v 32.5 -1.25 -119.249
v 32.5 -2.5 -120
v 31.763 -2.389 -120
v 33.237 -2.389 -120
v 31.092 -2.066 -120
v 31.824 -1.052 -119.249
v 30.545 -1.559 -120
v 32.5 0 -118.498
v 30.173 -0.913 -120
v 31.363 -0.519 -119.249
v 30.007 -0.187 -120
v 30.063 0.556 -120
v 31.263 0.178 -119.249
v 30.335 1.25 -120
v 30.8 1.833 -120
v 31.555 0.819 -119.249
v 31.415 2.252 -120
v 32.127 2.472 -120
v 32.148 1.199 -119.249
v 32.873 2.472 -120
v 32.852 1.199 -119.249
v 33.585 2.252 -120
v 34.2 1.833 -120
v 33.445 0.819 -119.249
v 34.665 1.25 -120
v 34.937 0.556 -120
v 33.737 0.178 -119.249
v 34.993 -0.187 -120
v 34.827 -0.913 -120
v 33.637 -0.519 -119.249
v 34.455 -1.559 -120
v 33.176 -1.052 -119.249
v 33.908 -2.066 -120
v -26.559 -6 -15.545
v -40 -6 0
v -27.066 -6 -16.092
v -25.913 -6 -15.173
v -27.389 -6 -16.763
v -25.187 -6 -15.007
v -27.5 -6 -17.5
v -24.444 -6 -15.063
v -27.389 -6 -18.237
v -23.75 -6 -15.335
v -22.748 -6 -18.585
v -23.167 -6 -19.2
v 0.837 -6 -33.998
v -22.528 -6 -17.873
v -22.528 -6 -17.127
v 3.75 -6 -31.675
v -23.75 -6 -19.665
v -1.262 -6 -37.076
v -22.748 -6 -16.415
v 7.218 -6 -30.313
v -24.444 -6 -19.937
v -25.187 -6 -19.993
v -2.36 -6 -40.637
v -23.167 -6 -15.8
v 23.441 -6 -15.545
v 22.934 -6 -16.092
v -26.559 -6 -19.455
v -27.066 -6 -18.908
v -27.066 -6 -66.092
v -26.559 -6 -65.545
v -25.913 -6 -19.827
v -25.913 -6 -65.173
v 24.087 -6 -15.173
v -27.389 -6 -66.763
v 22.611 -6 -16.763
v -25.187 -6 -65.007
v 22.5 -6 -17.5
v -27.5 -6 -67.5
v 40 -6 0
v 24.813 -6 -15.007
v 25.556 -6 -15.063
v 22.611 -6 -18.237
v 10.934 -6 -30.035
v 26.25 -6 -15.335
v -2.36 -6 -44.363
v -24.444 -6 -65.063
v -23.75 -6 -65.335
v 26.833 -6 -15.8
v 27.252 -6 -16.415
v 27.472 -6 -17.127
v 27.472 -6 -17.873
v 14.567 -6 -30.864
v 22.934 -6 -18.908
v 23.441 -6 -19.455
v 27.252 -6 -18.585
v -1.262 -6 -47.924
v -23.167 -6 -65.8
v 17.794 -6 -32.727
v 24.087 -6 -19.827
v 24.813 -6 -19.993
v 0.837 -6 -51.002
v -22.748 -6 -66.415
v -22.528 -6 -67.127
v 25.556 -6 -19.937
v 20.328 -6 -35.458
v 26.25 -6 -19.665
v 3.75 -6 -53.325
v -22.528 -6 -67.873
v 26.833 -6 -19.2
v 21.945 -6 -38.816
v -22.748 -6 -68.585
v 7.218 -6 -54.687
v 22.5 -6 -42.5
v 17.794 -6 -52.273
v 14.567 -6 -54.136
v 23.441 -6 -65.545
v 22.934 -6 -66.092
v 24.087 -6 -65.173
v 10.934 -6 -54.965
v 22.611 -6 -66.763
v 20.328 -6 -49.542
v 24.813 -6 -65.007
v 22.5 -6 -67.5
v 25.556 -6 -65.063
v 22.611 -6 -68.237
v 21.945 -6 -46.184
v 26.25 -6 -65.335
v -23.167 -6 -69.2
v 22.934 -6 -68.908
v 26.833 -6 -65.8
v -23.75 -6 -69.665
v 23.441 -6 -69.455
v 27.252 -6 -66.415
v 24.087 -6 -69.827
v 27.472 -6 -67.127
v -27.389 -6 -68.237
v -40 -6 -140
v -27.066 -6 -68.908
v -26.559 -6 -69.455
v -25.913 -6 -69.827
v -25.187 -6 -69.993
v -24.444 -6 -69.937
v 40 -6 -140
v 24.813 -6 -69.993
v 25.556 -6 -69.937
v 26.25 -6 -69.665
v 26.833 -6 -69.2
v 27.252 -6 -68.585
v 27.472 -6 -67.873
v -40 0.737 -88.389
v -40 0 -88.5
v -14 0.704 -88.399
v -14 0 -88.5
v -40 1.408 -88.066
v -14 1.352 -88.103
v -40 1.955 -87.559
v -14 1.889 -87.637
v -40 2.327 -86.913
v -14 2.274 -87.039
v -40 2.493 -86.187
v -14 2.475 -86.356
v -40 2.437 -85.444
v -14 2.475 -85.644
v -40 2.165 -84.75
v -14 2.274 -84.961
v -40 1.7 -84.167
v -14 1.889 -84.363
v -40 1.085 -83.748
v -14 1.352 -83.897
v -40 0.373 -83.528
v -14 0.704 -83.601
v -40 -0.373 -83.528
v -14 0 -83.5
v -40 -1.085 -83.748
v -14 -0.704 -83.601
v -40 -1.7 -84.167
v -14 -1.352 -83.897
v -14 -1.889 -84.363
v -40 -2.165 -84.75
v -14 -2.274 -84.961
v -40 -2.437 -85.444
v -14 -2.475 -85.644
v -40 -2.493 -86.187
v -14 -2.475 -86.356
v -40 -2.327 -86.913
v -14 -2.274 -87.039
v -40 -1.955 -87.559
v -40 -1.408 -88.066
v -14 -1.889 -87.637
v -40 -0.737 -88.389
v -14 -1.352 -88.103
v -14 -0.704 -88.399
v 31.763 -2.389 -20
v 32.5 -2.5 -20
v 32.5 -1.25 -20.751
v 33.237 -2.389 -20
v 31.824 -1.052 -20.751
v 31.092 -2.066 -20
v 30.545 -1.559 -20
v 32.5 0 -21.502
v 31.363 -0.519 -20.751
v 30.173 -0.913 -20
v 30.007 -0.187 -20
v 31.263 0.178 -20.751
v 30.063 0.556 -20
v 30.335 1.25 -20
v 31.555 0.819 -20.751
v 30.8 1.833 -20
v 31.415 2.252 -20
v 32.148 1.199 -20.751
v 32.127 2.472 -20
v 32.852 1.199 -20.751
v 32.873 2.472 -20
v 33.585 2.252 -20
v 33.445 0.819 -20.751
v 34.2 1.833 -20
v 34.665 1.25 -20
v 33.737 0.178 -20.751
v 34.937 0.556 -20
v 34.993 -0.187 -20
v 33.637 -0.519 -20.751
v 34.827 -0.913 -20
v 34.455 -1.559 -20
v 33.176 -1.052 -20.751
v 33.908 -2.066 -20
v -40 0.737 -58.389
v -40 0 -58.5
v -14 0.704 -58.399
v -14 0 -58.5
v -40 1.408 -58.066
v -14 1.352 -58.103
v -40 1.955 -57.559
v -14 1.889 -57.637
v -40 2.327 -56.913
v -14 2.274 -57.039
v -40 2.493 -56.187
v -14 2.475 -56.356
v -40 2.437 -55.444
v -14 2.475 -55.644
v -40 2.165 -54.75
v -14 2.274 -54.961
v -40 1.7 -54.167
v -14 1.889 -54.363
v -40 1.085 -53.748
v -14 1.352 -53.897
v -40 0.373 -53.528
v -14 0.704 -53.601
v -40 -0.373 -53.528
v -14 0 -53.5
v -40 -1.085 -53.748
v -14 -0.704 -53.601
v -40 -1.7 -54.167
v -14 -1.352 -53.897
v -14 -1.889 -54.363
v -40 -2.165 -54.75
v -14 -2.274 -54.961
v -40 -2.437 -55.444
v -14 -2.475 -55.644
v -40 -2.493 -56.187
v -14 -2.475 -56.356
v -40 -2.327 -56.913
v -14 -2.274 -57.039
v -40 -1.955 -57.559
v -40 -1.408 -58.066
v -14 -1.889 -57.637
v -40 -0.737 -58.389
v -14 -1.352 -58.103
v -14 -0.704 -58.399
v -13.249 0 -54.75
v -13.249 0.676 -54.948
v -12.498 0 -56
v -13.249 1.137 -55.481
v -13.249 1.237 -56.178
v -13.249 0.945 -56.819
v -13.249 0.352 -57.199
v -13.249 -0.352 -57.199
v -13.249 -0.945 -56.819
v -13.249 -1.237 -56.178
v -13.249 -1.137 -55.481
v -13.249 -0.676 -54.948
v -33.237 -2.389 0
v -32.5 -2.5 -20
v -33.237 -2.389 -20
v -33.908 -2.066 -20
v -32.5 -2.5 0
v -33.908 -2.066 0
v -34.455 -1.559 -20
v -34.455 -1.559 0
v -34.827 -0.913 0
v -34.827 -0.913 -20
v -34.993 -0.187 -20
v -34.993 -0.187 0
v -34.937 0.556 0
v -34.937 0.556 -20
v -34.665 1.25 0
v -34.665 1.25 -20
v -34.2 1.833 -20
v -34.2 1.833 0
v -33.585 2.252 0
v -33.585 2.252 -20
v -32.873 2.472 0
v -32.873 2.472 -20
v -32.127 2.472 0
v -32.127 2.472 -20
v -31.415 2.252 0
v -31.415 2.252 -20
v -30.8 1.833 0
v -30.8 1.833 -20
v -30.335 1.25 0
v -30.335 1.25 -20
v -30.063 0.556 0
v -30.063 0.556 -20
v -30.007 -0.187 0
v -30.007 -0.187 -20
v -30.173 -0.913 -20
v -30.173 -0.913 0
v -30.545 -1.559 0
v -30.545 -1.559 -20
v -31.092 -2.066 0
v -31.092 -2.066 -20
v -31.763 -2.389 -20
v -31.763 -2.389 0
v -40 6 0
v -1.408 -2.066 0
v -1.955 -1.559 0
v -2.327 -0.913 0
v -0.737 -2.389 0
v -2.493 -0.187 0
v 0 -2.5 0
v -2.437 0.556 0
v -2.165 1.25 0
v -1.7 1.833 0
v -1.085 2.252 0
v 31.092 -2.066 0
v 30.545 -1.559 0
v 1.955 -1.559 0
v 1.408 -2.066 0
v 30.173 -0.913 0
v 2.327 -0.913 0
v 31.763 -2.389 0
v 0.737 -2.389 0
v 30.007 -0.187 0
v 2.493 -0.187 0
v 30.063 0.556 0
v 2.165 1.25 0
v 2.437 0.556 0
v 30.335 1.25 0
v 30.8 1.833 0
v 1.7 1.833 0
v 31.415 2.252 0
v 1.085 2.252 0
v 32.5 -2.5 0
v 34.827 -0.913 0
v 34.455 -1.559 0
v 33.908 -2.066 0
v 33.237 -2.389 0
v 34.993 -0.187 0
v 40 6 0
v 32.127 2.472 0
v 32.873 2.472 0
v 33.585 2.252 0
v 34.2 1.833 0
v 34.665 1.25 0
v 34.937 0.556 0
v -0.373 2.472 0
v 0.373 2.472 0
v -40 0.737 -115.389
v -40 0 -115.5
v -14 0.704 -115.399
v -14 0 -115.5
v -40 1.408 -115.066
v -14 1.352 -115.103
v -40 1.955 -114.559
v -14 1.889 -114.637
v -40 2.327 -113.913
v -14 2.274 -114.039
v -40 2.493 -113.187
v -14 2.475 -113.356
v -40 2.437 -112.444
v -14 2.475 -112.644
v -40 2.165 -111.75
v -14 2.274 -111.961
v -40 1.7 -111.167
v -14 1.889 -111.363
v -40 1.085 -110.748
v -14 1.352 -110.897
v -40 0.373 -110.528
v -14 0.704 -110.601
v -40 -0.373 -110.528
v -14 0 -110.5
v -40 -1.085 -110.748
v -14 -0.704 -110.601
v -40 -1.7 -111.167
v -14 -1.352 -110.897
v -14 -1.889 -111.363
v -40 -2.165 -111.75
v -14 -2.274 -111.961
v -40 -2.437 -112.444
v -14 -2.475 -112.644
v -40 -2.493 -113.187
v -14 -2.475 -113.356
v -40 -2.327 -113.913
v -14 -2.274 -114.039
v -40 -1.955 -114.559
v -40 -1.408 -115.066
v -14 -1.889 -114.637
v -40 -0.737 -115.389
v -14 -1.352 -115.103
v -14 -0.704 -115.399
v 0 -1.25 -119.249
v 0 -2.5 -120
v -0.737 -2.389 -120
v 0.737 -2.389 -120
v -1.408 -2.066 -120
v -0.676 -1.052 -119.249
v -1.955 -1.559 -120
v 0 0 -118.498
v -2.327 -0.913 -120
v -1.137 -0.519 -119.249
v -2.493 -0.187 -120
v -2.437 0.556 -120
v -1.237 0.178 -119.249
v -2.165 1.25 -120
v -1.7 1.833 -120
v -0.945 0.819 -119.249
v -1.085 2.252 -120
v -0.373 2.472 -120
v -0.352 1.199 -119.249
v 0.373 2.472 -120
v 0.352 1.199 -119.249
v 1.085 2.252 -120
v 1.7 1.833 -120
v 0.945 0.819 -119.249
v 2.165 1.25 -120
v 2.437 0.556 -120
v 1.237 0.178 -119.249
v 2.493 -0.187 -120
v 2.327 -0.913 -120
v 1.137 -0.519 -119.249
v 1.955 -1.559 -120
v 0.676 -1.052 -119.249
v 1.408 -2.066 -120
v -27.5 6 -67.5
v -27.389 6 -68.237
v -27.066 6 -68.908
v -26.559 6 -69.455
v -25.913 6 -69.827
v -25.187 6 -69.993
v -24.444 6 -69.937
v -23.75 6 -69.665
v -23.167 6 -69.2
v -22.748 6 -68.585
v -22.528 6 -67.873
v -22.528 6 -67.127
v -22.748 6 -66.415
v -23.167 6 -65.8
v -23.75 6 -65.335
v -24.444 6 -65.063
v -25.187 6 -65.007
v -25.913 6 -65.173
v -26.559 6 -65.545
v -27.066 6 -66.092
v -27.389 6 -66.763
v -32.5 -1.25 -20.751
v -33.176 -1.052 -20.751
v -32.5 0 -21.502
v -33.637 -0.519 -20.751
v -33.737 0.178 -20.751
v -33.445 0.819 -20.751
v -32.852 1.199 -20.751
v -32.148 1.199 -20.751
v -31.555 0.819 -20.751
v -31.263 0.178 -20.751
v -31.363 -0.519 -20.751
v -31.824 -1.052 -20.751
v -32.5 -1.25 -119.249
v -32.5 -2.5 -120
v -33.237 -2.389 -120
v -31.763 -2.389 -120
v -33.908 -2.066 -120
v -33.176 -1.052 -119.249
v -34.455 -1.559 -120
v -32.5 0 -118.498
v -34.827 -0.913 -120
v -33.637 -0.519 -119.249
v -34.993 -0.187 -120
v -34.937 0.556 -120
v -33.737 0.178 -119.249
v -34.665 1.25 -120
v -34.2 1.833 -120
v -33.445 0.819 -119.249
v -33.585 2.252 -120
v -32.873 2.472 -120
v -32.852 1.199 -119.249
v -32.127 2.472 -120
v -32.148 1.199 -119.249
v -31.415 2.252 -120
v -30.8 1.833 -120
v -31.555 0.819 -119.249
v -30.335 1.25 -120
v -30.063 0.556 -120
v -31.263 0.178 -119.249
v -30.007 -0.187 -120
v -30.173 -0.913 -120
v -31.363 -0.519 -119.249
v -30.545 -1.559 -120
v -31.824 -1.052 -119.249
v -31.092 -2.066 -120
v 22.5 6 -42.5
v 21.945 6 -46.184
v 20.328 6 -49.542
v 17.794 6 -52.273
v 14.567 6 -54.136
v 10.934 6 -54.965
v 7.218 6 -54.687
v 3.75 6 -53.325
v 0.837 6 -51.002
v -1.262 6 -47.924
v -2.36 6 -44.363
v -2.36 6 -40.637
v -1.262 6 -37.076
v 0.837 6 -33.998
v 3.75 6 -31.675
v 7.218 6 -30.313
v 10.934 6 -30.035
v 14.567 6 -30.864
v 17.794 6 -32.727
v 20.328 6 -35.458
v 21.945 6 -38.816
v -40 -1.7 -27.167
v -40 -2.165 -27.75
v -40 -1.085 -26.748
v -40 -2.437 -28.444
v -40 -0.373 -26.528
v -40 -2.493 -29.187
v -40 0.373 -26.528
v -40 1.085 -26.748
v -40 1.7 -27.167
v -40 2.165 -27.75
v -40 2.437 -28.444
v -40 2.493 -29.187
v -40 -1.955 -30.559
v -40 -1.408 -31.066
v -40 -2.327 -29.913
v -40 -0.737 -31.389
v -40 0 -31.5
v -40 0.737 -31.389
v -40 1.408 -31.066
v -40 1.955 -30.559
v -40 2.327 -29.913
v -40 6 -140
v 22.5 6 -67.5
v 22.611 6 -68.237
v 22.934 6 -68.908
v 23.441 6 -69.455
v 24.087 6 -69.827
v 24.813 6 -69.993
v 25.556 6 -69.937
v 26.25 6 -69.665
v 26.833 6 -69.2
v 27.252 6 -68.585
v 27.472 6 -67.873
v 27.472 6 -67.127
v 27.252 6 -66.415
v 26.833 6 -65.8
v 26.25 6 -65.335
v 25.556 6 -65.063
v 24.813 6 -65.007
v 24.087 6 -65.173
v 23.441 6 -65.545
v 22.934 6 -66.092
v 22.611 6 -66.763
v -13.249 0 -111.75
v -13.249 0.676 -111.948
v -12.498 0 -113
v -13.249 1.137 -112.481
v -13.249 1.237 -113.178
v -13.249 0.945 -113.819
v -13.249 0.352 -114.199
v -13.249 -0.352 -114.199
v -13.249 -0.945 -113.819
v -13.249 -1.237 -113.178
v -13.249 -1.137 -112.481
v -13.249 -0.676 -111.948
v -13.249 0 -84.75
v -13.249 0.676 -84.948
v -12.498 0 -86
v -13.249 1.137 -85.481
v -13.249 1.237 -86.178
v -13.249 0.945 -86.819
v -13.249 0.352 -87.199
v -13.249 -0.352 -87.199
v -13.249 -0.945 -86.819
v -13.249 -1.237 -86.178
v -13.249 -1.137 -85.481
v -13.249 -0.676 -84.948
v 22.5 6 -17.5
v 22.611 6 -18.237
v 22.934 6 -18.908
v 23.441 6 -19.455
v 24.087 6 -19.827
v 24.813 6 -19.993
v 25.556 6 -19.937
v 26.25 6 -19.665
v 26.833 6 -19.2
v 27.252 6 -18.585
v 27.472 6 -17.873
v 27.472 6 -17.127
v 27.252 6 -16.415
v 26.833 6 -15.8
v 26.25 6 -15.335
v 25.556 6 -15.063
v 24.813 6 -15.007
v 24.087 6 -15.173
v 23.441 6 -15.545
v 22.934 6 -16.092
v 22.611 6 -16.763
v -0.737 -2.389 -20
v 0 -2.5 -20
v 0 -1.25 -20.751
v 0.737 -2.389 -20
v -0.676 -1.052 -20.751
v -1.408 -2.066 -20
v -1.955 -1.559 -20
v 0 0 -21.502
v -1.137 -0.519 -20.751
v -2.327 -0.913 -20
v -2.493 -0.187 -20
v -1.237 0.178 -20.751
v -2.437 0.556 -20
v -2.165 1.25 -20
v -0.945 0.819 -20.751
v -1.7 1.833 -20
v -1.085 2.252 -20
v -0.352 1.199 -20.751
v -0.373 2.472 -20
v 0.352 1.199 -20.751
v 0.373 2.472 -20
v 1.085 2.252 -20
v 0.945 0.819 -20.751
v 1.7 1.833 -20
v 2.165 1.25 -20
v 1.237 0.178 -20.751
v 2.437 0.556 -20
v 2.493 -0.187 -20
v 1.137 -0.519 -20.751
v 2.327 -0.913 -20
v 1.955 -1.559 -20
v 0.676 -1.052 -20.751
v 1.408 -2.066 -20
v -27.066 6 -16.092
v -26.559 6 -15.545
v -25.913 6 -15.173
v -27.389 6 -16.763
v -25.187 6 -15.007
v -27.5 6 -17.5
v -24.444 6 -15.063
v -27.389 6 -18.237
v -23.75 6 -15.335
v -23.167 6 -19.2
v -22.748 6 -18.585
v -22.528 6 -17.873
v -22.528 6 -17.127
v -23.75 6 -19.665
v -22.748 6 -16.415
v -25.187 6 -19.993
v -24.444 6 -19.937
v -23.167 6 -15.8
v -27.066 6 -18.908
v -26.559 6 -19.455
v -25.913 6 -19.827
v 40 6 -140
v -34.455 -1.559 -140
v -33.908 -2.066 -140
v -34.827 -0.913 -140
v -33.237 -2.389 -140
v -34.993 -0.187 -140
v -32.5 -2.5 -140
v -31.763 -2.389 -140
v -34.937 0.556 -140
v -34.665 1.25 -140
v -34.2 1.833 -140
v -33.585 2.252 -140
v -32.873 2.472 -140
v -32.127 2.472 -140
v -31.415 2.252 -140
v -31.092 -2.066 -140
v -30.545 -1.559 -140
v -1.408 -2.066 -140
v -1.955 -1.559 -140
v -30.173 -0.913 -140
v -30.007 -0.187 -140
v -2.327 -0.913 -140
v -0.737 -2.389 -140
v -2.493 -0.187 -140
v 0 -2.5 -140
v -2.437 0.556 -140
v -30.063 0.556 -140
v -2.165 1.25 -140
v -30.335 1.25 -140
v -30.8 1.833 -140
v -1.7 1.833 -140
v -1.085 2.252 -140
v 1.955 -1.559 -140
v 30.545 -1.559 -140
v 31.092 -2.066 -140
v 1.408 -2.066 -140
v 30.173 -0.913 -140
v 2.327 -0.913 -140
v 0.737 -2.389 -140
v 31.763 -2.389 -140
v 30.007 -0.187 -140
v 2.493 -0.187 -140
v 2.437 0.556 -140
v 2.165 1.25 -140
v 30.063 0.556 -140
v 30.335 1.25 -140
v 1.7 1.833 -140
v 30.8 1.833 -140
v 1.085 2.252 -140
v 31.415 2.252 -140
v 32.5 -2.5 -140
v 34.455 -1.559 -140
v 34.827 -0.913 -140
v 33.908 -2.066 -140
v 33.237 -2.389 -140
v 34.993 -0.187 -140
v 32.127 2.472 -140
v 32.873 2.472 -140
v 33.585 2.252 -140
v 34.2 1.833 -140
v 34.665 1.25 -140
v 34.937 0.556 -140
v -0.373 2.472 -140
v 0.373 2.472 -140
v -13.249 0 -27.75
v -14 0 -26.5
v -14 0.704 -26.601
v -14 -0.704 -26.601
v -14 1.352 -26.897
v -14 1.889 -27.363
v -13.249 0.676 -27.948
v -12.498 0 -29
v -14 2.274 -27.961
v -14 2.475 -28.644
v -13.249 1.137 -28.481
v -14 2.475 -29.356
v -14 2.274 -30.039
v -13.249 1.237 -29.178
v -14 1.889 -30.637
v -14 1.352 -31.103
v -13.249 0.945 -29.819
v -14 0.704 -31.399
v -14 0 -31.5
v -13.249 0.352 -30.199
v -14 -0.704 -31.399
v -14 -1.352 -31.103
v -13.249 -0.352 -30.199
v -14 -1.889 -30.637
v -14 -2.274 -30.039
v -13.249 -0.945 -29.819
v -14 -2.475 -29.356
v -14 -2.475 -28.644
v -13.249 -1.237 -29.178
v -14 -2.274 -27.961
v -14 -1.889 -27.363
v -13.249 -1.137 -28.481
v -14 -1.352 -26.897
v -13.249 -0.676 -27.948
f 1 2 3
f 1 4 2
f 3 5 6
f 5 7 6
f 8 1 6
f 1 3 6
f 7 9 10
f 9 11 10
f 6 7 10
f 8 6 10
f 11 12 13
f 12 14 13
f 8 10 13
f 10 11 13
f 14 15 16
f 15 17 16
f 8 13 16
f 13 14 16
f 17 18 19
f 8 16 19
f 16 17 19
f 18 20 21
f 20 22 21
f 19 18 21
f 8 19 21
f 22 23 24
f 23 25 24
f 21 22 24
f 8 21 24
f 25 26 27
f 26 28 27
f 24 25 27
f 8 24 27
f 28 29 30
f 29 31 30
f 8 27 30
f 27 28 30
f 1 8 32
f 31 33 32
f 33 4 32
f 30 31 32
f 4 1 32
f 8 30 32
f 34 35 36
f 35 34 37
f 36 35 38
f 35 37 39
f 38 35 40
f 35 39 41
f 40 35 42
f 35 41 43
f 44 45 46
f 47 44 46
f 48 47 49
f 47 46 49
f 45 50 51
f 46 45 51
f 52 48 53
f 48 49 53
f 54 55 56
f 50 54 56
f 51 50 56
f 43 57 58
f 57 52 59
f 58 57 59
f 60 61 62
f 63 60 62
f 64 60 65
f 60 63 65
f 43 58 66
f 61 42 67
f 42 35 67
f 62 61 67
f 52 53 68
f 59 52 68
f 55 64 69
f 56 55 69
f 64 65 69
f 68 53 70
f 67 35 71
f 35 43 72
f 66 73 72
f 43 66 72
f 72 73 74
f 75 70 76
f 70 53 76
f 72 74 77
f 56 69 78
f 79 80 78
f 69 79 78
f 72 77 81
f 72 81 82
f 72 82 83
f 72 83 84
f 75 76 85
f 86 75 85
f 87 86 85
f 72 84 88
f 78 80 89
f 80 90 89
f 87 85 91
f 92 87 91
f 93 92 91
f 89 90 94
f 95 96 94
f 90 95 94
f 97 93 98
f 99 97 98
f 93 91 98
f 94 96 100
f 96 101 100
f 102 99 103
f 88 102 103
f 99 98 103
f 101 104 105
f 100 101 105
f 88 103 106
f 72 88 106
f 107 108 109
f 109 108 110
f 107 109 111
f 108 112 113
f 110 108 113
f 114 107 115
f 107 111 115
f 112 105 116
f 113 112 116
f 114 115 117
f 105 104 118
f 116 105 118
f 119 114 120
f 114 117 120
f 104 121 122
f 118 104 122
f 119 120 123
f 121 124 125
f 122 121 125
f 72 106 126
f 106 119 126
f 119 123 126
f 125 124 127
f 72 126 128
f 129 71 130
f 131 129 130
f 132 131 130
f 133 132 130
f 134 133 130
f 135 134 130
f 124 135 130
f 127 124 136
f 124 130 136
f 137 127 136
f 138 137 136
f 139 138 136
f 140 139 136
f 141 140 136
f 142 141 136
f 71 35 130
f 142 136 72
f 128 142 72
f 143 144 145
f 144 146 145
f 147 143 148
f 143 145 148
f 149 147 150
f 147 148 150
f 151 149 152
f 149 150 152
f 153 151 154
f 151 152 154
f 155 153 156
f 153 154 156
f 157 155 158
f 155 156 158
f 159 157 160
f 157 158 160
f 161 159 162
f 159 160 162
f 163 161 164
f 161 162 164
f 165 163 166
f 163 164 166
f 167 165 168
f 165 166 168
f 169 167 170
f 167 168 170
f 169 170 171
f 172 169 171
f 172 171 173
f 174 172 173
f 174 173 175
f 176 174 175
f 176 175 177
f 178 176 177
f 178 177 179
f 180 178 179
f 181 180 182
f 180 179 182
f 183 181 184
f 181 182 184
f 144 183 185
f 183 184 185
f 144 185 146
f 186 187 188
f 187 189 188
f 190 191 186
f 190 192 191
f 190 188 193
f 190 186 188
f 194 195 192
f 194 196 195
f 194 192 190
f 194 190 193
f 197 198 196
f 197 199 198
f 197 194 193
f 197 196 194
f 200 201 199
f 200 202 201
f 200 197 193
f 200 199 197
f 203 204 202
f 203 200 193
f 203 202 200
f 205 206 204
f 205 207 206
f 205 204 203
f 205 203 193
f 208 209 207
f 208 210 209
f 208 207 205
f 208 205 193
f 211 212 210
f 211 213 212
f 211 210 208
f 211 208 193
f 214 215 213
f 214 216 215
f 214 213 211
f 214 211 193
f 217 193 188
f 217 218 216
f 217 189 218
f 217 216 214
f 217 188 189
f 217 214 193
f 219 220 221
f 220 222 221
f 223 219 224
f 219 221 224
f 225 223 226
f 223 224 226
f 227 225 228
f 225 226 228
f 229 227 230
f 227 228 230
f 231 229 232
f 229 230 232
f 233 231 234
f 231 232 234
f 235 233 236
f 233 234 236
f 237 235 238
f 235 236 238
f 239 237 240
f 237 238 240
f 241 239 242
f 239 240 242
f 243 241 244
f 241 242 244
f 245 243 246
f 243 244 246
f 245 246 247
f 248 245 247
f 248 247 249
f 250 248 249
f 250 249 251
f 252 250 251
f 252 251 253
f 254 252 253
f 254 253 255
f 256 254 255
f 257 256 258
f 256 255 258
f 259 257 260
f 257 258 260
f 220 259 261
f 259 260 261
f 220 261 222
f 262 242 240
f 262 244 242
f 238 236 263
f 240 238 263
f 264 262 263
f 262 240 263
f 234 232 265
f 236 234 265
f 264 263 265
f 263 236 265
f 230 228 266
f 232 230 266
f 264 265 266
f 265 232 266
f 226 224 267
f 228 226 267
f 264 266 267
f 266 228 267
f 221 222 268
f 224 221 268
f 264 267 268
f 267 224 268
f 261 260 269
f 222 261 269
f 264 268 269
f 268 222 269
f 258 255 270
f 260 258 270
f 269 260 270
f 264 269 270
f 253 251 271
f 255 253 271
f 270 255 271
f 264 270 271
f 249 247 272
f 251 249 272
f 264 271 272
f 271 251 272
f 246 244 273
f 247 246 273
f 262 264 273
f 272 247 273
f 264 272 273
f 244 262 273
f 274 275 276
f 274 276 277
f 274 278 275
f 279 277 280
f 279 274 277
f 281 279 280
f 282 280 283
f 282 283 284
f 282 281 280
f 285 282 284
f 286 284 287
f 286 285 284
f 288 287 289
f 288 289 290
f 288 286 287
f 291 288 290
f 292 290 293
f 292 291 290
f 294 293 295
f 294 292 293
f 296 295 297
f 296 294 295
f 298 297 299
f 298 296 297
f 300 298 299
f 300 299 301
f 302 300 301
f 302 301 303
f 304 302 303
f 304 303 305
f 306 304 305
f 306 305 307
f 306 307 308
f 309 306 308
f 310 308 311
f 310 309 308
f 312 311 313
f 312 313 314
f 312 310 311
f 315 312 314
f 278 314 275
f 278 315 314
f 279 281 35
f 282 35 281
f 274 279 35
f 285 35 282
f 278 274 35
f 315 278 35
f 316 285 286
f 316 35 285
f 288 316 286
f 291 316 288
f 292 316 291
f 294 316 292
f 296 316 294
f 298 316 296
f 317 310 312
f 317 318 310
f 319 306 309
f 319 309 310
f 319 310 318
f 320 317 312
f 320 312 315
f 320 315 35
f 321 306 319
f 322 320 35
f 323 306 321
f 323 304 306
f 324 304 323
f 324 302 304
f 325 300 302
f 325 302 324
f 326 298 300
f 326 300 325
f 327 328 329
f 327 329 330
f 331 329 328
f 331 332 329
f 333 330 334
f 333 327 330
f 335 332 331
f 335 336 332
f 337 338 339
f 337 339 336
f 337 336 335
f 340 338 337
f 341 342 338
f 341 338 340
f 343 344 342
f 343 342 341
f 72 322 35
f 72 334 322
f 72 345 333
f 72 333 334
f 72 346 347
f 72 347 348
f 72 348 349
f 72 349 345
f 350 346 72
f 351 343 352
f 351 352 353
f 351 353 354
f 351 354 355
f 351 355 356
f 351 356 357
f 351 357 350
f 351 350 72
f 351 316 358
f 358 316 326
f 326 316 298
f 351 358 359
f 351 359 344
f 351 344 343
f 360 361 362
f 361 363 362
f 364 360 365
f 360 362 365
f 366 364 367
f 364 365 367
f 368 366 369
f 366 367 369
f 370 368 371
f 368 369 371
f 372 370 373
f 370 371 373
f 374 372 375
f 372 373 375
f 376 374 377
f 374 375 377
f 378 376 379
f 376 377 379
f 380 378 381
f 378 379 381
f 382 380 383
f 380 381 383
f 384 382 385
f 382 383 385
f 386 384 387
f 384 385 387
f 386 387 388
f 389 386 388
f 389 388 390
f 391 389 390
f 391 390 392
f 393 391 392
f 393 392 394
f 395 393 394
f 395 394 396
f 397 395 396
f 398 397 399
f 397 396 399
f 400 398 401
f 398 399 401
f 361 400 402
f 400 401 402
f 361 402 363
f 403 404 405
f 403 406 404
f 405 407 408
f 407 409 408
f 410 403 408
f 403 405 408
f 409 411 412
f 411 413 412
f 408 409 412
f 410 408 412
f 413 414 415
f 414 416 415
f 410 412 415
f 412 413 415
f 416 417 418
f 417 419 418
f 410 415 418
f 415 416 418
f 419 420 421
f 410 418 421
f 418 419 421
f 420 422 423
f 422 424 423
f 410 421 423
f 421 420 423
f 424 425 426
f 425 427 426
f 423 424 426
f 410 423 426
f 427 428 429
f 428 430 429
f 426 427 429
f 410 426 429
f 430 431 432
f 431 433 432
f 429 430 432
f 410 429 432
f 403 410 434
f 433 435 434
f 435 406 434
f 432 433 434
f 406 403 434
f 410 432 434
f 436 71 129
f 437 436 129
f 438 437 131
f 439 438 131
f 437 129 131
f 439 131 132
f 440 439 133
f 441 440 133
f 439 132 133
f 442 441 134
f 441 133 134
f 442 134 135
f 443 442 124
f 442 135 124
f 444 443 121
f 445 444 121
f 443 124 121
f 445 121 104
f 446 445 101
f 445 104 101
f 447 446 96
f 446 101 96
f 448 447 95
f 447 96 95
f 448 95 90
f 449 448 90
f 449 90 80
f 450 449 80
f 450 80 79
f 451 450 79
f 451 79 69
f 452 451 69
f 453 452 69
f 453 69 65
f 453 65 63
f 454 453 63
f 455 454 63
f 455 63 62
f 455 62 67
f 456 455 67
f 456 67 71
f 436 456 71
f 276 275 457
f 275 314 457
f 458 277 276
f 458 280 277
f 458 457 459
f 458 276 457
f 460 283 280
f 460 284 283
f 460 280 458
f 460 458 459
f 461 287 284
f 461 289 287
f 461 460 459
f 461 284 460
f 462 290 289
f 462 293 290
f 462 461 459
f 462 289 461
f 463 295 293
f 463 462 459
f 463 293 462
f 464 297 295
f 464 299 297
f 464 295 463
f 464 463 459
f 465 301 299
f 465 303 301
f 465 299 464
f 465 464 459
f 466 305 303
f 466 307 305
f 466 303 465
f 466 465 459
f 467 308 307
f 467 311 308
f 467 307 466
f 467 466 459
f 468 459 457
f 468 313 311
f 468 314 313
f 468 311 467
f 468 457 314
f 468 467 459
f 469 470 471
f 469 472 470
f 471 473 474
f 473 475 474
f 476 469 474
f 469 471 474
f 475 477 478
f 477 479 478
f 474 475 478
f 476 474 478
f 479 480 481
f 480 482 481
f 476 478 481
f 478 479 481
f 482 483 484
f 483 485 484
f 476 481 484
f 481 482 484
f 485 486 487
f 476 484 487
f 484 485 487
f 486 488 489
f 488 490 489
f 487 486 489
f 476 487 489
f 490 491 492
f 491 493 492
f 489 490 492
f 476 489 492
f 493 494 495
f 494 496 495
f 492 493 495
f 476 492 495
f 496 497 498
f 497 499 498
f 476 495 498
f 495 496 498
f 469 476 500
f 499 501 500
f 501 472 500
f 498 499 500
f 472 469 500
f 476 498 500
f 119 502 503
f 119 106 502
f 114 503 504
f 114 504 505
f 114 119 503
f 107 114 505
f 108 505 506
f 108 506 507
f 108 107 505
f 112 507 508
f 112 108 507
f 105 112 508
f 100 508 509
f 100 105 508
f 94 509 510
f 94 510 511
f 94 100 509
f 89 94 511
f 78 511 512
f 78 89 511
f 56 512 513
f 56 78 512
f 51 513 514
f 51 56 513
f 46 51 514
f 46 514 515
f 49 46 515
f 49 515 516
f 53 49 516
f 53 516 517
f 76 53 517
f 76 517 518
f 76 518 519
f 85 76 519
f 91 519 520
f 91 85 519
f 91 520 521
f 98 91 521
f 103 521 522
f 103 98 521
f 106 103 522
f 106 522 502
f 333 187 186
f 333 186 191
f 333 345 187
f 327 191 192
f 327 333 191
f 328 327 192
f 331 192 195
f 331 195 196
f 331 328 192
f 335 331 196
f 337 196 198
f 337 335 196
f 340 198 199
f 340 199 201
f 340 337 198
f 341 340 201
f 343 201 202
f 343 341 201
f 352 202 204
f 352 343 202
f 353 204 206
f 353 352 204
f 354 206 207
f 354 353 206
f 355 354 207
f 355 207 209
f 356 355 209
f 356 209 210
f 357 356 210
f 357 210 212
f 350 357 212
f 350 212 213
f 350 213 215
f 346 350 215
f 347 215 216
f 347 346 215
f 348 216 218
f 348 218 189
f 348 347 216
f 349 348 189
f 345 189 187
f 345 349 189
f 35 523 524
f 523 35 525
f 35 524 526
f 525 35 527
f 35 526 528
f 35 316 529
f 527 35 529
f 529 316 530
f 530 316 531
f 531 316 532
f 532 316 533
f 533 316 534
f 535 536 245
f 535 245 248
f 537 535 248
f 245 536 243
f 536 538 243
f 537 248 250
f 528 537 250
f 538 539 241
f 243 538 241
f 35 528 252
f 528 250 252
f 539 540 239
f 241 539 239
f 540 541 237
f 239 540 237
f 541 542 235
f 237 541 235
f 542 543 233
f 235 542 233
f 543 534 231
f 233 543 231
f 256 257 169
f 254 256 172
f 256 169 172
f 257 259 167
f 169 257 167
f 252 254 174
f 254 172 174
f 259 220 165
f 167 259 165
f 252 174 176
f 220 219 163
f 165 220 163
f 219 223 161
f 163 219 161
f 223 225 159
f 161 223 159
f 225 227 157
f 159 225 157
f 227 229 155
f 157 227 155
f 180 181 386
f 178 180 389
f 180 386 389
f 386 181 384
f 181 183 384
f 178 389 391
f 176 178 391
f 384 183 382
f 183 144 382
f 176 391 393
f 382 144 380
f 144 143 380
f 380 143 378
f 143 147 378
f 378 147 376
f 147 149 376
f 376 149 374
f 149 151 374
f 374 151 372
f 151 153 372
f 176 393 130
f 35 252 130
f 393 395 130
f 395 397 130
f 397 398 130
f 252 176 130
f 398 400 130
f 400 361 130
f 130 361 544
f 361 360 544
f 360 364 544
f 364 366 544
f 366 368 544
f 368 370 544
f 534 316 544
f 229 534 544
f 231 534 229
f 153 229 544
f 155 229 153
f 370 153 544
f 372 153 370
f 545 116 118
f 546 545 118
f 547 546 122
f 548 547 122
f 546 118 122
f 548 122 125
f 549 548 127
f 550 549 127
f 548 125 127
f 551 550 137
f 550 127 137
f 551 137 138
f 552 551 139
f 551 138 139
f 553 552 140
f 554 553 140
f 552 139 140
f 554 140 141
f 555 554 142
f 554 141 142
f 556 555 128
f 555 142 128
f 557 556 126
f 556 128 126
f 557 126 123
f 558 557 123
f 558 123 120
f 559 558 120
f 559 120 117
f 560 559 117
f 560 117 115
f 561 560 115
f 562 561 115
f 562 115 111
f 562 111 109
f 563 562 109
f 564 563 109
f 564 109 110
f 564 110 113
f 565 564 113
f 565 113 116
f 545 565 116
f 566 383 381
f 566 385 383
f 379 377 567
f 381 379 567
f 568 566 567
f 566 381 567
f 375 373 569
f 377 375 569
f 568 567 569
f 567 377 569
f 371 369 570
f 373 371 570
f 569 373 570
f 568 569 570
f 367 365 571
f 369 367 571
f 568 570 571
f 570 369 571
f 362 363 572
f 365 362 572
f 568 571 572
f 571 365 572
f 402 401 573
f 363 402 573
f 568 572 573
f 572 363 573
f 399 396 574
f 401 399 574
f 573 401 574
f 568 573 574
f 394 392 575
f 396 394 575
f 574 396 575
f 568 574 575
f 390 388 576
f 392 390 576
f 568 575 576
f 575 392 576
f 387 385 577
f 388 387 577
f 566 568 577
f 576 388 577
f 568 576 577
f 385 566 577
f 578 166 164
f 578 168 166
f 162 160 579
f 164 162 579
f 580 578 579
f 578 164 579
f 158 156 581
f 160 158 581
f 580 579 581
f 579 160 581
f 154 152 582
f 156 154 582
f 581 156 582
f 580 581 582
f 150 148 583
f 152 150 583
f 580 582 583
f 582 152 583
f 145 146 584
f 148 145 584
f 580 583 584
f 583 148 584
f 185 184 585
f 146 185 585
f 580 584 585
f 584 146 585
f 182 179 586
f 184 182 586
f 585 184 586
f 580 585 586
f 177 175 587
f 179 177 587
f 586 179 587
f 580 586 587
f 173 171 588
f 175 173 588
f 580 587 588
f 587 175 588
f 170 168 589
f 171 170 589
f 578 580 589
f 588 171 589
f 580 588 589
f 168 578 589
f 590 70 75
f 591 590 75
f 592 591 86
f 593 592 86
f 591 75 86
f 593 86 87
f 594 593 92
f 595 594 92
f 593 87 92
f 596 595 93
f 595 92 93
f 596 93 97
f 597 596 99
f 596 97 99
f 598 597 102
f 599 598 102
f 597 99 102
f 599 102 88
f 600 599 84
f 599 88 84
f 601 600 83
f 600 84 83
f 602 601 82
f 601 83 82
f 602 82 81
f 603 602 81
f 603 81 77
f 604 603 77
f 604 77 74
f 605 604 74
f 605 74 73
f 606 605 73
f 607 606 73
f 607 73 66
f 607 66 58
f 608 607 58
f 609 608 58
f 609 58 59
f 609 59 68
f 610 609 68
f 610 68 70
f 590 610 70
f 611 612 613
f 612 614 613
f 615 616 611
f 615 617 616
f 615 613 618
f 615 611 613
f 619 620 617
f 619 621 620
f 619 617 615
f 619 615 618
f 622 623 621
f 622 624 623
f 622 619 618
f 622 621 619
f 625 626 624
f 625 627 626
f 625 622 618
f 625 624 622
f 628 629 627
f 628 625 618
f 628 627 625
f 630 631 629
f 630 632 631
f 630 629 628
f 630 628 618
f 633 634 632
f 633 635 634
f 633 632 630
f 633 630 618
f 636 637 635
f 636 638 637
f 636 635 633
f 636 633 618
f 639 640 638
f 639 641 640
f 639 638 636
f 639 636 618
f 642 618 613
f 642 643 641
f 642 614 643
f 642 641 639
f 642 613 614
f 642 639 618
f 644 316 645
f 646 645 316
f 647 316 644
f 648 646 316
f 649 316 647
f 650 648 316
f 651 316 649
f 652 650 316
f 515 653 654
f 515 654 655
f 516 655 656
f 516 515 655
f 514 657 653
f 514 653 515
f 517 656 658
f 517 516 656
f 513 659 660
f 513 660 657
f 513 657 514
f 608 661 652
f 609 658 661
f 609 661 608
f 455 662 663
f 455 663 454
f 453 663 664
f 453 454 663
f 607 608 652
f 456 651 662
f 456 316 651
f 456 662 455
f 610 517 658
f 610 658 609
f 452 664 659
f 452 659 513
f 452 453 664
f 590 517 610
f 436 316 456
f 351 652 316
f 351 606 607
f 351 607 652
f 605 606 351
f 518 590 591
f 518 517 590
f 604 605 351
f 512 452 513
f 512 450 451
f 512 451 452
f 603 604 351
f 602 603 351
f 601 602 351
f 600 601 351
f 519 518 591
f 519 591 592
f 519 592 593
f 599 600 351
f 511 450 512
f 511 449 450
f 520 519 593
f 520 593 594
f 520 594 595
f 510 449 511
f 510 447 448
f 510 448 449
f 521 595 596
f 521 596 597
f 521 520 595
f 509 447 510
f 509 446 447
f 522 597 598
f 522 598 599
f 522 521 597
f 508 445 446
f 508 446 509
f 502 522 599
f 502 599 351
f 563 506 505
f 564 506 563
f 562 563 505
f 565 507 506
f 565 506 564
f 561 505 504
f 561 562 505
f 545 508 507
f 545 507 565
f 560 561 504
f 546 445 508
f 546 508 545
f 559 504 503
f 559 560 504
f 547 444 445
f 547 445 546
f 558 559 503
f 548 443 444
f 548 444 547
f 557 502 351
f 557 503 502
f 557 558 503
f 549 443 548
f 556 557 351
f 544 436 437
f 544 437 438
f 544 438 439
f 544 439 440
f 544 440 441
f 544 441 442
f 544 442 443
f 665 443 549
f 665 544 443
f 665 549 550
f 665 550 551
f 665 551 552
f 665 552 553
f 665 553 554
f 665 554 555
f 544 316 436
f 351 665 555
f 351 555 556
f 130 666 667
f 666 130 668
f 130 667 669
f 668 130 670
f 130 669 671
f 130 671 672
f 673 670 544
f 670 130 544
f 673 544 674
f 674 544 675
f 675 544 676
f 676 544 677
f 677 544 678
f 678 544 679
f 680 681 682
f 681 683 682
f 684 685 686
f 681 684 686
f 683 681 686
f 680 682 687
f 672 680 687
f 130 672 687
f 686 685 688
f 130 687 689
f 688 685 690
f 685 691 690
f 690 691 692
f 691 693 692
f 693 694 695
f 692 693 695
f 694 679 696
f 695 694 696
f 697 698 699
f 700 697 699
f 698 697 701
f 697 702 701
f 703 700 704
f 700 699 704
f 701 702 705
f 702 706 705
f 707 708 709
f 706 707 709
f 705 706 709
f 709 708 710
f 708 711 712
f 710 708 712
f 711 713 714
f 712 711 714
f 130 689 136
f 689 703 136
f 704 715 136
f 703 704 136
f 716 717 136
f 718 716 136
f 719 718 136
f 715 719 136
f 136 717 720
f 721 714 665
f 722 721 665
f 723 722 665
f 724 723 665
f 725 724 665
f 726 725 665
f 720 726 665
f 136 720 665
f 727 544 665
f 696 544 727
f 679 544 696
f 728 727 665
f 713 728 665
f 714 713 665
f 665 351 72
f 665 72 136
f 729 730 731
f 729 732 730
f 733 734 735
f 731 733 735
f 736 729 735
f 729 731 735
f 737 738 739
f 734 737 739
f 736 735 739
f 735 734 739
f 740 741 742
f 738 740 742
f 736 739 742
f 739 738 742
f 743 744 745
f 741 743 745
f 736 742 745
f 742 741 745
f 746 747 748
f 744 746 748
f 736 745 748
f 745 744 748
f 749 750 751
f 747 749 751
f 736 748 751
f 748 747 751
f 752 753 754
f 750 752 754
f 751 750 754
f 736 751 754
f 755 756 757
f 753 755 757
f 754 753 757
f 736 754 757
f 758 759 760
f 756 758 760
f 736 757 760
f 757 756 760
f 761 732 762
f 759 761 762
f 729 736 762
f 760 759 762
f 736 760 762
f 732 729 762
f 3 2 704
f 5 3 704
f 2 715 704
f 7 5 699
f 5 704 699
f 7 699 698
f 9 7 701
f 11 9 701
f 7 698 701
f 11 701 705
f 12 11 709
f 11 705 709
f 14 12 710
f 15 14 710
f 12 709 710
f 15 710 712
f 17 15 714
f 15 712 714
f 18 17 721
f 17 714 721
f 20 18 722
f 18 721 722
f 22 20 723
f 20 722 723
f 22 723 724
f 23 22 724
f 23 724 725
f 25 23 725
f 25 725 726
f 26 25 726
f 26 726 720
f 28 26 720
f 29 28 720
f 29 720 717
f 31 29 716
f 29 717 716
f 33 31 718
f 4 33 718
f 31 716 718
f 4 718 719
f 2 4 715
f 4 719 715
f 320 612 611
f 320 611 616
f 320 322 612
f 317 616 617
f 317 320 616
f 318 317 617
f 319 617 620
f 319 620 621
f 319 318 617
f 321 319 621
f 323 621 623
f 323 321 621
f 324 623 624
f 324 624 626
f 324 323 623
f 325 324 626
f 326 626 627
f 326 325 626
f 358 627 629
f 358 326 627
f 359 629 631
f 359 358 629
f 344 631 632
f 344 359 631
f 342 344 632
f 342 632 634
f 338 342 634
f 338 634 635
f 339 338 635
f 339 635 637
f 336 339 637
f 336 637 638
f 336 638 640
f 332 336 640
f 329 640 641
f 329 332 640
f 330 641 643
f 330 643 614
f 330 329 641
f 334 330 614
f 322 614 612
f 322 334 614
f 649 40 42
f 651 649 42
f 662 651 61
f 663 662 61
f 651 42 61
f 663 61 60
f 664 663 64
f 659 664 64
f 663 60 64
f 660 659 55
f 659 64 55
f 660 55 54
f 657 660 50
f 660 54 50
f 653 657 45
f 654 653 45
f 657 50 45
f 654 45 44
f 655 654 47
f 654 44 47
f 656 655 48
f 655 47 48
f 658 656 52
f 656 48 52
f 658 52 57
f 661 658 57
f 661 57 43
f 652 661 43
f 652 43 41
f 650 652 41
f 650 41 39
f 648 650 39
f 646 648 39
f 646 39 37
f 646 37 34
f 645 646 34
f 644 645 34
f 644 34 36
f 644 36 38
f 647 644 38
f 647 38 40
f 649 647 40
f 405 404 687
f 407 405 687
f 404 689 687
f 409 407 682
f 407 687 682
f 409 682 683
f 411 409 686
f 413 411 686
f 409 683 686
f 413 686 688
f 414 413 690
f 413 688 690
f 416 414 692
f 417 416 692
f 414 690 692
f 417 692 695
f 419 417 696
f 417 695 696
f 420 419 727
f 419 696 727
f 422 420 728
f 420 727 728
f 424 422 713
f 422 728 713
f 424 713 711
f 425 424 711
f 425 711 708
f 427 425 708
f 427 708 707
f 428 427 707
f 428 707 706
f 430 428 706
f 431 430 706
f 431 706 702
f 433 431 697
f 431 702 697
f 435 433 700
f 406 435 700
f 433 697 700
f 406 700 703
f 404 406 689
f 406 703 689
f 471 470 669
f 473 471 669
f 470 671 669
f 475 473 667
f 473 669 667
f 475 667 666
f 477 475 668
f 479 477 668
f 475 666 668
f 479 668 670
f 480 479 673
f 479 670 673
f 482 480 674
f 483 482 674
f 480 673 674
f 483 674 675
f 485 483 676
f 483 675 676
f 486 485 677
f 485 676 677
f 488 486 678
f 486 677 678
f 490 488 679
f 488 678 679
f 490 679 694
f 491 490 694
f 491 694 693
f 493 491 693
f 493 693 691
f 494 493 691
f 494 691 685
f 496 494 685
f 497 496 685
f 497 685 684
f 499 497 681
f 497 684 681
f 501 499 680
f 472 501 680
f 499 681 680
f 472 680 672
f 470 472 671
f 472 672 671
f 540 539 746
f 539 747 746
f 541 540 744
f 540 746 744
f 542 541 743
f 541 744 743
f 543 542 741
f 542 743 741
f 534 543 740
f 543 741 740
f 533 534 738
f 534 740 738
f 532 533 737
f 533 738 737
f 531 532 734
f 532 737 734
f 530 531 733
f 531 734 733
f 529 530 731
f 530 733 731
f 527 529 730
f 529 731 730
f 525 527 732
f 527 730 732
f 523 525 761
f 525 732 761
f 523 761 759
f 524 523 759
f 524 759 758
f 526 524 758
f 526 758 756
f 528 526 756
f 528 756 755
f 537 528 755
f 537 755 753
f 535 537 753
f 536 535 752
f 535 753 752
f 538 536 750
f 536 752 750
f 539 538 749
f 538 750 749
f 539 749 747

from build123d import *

# Parameters (mm, degrees)
SKETCH1_W                        = 80
SKETCH1_H                        = 140
SKETCH1_R                        = 12.5
BOSS_EXTRUDE1_DEPTH              = 6
TAP_DRILL_FOR_M6_TAP1_D          = 5
TAP_DRILL_FOR_M6_TAP2_AT_2_COUNT = 2
TAP_DRILL_FOR_M6_TAP2_AT_2_PITCH = 32.5
TAP_DRILL_FOR_M6_TAP2_AT_3_COUNT = 2
TAP_DRILL_FOR_M6_TAP2_AT_3_PITCH = 65
TAP_DRILL_FOR_M6_TAP3_D          = 5
TAP_DRILL_FOR_M6_TAP3_DEPTH      = 26
TAP_DRILL_FOR_M6_TAP3_TIP        = 1.502151548


with BuildPart() as part:
    # Sketch1 → Boss-Extrude1 (new body, symmetric)
    with BuildSketch(Plane(origin=(0, 0, 0), x_dir=(1, 0, 0), z_dir=(0, 1, 0))):
        with Locations((0, 70)):
            Rectangle(SKETCH1_W, SKETCH1_H)
        with Locations((10, 42.5)):
            Circle(SKETCH1_R, mode=Mode.SUBTRACT)
    extrude(amount=BOSS_EXTRUDE1_DEPTH, both=True)

    # Tap Drill for M6 Tap1 (through all)
    with Locations(Plane(origin=(0, 6, 0), x_dir=(1, 0, 0), z_dir=(0, 1, 0))):
        with Locations((-25, 67.5), (25, 67.5), (25, 17.5), (-25, 17.5)):
            Hole(TAP_DRILL_FOR_M6_TAP1_D / 2)

    # Sketch9 → Tap Drill for M6 Tap2 (revolve, cut)
    with BuildSketch(Plane(origin=(32.5, 0, 0), x_dir=(0, -1, 0), z_dir=(1, 0, 0))):
        Polygon((0, 0), (0, 21.502151548), (2.5, 20), (2.5, 0), align=None)
    tap_drill_for_m6_tap2 = revolve(axis=Axis((32.5, 0, 6.35), (0, 0, -1)), mode=Mode.SUBTRACT)

    # Tap Drill for M6 Tap2 at 2: Tap Drill for M6 Tap2 ×2
    with Locations(*[(-i * TAP_DRILL_FOR_M6_TAP2_AT_2_PITCH, 0, 0) for i in range(1, TAP_DRILL_FOR_M6_TAP2_AT_2_COUNT)]):
        add(tap_drill_for_m6_tap2, mode=Mode.SUBTRACT)

    # Tap Drill for M6 Tap2 at 3: Tap Drill for M6 Tap2 ×2
    with Locations(*[(-i * TAP_DRILL_FOR_M6_TAP2_AT_3_PITCH, 0, 0) for i in range(1, TAP_DRILL_FOR_M6_TAP2_AT_3_COUNT)]):
        add(tap_drill_for_m6_tap2, mode=Mode.SUBTRACT)

    # Mirror1: Tap Drill for M6 Tap2 across plane
    add(tap_drill_for_m6_tap2.mirror(Plane(origin=(0, 0, -70), x_dir=(1, 0, 0), z_dir=(0, 0, -1))), mode=Mode.SUBTRACT)

    # Mirror1 copy 1 sketch → Mirror1 copy 1 (revolve, cut)
    with BuildSketch(Plane(origin=(0, 0, -140), x_dir=(0, -1, 0), z_dir=(1, 0, 0))):
        Polygon((0, 0), (0, -21.502151548), (2.5, -20), (2.5, 0), align=None)
    revolve(axis=Axis((0, 0, -146.35), (0, 0, -1)), mode=Mode.SUBTRACT)

    # Mirror1 copy 2 sketch → Mirror1 copy 2 (revolve, cut)
    with BuildSketch(Plane(origin=(-32.5, 0, -140), x_dir=(0, -1, 0), z_dir=(1, 0, 0))):
        Polygon((0, 0), (0, -21.502151548), (2.5, -20), (2.5, 0), align=None)
    revolve(axis=Axis((-32.5, 0, -146.35), (0, 0, -1)), mode=Mode.SUBTRACT)

    # Tap Drill for M6 Tap3
    with Locations(Plane.ZY.offset(40)):
        with Locations((-113, 0), (-86, 0), (-56, 0), (-29, 0)):
            Hole(TAP_DRILL_FOR_M6_TAP3_D / 2, depth=TAP_DRILL_FOR_M6_TAP3_DEPTH)
            with Locations((0, 0, -(TAP_DRILL_FOR_M6_TAP3_DEPTH + TAP_DRILL_FOR_M6_TAP3_TIP / 2))):  # 118° drill point
                Cone(0, TAP_DRILL_FOR_M6_TAP3_D / 2, TAP_DRILL_FOR_M6_TAP3_TIP, mode=Mode.SUBTRACT)


solid = part.part
